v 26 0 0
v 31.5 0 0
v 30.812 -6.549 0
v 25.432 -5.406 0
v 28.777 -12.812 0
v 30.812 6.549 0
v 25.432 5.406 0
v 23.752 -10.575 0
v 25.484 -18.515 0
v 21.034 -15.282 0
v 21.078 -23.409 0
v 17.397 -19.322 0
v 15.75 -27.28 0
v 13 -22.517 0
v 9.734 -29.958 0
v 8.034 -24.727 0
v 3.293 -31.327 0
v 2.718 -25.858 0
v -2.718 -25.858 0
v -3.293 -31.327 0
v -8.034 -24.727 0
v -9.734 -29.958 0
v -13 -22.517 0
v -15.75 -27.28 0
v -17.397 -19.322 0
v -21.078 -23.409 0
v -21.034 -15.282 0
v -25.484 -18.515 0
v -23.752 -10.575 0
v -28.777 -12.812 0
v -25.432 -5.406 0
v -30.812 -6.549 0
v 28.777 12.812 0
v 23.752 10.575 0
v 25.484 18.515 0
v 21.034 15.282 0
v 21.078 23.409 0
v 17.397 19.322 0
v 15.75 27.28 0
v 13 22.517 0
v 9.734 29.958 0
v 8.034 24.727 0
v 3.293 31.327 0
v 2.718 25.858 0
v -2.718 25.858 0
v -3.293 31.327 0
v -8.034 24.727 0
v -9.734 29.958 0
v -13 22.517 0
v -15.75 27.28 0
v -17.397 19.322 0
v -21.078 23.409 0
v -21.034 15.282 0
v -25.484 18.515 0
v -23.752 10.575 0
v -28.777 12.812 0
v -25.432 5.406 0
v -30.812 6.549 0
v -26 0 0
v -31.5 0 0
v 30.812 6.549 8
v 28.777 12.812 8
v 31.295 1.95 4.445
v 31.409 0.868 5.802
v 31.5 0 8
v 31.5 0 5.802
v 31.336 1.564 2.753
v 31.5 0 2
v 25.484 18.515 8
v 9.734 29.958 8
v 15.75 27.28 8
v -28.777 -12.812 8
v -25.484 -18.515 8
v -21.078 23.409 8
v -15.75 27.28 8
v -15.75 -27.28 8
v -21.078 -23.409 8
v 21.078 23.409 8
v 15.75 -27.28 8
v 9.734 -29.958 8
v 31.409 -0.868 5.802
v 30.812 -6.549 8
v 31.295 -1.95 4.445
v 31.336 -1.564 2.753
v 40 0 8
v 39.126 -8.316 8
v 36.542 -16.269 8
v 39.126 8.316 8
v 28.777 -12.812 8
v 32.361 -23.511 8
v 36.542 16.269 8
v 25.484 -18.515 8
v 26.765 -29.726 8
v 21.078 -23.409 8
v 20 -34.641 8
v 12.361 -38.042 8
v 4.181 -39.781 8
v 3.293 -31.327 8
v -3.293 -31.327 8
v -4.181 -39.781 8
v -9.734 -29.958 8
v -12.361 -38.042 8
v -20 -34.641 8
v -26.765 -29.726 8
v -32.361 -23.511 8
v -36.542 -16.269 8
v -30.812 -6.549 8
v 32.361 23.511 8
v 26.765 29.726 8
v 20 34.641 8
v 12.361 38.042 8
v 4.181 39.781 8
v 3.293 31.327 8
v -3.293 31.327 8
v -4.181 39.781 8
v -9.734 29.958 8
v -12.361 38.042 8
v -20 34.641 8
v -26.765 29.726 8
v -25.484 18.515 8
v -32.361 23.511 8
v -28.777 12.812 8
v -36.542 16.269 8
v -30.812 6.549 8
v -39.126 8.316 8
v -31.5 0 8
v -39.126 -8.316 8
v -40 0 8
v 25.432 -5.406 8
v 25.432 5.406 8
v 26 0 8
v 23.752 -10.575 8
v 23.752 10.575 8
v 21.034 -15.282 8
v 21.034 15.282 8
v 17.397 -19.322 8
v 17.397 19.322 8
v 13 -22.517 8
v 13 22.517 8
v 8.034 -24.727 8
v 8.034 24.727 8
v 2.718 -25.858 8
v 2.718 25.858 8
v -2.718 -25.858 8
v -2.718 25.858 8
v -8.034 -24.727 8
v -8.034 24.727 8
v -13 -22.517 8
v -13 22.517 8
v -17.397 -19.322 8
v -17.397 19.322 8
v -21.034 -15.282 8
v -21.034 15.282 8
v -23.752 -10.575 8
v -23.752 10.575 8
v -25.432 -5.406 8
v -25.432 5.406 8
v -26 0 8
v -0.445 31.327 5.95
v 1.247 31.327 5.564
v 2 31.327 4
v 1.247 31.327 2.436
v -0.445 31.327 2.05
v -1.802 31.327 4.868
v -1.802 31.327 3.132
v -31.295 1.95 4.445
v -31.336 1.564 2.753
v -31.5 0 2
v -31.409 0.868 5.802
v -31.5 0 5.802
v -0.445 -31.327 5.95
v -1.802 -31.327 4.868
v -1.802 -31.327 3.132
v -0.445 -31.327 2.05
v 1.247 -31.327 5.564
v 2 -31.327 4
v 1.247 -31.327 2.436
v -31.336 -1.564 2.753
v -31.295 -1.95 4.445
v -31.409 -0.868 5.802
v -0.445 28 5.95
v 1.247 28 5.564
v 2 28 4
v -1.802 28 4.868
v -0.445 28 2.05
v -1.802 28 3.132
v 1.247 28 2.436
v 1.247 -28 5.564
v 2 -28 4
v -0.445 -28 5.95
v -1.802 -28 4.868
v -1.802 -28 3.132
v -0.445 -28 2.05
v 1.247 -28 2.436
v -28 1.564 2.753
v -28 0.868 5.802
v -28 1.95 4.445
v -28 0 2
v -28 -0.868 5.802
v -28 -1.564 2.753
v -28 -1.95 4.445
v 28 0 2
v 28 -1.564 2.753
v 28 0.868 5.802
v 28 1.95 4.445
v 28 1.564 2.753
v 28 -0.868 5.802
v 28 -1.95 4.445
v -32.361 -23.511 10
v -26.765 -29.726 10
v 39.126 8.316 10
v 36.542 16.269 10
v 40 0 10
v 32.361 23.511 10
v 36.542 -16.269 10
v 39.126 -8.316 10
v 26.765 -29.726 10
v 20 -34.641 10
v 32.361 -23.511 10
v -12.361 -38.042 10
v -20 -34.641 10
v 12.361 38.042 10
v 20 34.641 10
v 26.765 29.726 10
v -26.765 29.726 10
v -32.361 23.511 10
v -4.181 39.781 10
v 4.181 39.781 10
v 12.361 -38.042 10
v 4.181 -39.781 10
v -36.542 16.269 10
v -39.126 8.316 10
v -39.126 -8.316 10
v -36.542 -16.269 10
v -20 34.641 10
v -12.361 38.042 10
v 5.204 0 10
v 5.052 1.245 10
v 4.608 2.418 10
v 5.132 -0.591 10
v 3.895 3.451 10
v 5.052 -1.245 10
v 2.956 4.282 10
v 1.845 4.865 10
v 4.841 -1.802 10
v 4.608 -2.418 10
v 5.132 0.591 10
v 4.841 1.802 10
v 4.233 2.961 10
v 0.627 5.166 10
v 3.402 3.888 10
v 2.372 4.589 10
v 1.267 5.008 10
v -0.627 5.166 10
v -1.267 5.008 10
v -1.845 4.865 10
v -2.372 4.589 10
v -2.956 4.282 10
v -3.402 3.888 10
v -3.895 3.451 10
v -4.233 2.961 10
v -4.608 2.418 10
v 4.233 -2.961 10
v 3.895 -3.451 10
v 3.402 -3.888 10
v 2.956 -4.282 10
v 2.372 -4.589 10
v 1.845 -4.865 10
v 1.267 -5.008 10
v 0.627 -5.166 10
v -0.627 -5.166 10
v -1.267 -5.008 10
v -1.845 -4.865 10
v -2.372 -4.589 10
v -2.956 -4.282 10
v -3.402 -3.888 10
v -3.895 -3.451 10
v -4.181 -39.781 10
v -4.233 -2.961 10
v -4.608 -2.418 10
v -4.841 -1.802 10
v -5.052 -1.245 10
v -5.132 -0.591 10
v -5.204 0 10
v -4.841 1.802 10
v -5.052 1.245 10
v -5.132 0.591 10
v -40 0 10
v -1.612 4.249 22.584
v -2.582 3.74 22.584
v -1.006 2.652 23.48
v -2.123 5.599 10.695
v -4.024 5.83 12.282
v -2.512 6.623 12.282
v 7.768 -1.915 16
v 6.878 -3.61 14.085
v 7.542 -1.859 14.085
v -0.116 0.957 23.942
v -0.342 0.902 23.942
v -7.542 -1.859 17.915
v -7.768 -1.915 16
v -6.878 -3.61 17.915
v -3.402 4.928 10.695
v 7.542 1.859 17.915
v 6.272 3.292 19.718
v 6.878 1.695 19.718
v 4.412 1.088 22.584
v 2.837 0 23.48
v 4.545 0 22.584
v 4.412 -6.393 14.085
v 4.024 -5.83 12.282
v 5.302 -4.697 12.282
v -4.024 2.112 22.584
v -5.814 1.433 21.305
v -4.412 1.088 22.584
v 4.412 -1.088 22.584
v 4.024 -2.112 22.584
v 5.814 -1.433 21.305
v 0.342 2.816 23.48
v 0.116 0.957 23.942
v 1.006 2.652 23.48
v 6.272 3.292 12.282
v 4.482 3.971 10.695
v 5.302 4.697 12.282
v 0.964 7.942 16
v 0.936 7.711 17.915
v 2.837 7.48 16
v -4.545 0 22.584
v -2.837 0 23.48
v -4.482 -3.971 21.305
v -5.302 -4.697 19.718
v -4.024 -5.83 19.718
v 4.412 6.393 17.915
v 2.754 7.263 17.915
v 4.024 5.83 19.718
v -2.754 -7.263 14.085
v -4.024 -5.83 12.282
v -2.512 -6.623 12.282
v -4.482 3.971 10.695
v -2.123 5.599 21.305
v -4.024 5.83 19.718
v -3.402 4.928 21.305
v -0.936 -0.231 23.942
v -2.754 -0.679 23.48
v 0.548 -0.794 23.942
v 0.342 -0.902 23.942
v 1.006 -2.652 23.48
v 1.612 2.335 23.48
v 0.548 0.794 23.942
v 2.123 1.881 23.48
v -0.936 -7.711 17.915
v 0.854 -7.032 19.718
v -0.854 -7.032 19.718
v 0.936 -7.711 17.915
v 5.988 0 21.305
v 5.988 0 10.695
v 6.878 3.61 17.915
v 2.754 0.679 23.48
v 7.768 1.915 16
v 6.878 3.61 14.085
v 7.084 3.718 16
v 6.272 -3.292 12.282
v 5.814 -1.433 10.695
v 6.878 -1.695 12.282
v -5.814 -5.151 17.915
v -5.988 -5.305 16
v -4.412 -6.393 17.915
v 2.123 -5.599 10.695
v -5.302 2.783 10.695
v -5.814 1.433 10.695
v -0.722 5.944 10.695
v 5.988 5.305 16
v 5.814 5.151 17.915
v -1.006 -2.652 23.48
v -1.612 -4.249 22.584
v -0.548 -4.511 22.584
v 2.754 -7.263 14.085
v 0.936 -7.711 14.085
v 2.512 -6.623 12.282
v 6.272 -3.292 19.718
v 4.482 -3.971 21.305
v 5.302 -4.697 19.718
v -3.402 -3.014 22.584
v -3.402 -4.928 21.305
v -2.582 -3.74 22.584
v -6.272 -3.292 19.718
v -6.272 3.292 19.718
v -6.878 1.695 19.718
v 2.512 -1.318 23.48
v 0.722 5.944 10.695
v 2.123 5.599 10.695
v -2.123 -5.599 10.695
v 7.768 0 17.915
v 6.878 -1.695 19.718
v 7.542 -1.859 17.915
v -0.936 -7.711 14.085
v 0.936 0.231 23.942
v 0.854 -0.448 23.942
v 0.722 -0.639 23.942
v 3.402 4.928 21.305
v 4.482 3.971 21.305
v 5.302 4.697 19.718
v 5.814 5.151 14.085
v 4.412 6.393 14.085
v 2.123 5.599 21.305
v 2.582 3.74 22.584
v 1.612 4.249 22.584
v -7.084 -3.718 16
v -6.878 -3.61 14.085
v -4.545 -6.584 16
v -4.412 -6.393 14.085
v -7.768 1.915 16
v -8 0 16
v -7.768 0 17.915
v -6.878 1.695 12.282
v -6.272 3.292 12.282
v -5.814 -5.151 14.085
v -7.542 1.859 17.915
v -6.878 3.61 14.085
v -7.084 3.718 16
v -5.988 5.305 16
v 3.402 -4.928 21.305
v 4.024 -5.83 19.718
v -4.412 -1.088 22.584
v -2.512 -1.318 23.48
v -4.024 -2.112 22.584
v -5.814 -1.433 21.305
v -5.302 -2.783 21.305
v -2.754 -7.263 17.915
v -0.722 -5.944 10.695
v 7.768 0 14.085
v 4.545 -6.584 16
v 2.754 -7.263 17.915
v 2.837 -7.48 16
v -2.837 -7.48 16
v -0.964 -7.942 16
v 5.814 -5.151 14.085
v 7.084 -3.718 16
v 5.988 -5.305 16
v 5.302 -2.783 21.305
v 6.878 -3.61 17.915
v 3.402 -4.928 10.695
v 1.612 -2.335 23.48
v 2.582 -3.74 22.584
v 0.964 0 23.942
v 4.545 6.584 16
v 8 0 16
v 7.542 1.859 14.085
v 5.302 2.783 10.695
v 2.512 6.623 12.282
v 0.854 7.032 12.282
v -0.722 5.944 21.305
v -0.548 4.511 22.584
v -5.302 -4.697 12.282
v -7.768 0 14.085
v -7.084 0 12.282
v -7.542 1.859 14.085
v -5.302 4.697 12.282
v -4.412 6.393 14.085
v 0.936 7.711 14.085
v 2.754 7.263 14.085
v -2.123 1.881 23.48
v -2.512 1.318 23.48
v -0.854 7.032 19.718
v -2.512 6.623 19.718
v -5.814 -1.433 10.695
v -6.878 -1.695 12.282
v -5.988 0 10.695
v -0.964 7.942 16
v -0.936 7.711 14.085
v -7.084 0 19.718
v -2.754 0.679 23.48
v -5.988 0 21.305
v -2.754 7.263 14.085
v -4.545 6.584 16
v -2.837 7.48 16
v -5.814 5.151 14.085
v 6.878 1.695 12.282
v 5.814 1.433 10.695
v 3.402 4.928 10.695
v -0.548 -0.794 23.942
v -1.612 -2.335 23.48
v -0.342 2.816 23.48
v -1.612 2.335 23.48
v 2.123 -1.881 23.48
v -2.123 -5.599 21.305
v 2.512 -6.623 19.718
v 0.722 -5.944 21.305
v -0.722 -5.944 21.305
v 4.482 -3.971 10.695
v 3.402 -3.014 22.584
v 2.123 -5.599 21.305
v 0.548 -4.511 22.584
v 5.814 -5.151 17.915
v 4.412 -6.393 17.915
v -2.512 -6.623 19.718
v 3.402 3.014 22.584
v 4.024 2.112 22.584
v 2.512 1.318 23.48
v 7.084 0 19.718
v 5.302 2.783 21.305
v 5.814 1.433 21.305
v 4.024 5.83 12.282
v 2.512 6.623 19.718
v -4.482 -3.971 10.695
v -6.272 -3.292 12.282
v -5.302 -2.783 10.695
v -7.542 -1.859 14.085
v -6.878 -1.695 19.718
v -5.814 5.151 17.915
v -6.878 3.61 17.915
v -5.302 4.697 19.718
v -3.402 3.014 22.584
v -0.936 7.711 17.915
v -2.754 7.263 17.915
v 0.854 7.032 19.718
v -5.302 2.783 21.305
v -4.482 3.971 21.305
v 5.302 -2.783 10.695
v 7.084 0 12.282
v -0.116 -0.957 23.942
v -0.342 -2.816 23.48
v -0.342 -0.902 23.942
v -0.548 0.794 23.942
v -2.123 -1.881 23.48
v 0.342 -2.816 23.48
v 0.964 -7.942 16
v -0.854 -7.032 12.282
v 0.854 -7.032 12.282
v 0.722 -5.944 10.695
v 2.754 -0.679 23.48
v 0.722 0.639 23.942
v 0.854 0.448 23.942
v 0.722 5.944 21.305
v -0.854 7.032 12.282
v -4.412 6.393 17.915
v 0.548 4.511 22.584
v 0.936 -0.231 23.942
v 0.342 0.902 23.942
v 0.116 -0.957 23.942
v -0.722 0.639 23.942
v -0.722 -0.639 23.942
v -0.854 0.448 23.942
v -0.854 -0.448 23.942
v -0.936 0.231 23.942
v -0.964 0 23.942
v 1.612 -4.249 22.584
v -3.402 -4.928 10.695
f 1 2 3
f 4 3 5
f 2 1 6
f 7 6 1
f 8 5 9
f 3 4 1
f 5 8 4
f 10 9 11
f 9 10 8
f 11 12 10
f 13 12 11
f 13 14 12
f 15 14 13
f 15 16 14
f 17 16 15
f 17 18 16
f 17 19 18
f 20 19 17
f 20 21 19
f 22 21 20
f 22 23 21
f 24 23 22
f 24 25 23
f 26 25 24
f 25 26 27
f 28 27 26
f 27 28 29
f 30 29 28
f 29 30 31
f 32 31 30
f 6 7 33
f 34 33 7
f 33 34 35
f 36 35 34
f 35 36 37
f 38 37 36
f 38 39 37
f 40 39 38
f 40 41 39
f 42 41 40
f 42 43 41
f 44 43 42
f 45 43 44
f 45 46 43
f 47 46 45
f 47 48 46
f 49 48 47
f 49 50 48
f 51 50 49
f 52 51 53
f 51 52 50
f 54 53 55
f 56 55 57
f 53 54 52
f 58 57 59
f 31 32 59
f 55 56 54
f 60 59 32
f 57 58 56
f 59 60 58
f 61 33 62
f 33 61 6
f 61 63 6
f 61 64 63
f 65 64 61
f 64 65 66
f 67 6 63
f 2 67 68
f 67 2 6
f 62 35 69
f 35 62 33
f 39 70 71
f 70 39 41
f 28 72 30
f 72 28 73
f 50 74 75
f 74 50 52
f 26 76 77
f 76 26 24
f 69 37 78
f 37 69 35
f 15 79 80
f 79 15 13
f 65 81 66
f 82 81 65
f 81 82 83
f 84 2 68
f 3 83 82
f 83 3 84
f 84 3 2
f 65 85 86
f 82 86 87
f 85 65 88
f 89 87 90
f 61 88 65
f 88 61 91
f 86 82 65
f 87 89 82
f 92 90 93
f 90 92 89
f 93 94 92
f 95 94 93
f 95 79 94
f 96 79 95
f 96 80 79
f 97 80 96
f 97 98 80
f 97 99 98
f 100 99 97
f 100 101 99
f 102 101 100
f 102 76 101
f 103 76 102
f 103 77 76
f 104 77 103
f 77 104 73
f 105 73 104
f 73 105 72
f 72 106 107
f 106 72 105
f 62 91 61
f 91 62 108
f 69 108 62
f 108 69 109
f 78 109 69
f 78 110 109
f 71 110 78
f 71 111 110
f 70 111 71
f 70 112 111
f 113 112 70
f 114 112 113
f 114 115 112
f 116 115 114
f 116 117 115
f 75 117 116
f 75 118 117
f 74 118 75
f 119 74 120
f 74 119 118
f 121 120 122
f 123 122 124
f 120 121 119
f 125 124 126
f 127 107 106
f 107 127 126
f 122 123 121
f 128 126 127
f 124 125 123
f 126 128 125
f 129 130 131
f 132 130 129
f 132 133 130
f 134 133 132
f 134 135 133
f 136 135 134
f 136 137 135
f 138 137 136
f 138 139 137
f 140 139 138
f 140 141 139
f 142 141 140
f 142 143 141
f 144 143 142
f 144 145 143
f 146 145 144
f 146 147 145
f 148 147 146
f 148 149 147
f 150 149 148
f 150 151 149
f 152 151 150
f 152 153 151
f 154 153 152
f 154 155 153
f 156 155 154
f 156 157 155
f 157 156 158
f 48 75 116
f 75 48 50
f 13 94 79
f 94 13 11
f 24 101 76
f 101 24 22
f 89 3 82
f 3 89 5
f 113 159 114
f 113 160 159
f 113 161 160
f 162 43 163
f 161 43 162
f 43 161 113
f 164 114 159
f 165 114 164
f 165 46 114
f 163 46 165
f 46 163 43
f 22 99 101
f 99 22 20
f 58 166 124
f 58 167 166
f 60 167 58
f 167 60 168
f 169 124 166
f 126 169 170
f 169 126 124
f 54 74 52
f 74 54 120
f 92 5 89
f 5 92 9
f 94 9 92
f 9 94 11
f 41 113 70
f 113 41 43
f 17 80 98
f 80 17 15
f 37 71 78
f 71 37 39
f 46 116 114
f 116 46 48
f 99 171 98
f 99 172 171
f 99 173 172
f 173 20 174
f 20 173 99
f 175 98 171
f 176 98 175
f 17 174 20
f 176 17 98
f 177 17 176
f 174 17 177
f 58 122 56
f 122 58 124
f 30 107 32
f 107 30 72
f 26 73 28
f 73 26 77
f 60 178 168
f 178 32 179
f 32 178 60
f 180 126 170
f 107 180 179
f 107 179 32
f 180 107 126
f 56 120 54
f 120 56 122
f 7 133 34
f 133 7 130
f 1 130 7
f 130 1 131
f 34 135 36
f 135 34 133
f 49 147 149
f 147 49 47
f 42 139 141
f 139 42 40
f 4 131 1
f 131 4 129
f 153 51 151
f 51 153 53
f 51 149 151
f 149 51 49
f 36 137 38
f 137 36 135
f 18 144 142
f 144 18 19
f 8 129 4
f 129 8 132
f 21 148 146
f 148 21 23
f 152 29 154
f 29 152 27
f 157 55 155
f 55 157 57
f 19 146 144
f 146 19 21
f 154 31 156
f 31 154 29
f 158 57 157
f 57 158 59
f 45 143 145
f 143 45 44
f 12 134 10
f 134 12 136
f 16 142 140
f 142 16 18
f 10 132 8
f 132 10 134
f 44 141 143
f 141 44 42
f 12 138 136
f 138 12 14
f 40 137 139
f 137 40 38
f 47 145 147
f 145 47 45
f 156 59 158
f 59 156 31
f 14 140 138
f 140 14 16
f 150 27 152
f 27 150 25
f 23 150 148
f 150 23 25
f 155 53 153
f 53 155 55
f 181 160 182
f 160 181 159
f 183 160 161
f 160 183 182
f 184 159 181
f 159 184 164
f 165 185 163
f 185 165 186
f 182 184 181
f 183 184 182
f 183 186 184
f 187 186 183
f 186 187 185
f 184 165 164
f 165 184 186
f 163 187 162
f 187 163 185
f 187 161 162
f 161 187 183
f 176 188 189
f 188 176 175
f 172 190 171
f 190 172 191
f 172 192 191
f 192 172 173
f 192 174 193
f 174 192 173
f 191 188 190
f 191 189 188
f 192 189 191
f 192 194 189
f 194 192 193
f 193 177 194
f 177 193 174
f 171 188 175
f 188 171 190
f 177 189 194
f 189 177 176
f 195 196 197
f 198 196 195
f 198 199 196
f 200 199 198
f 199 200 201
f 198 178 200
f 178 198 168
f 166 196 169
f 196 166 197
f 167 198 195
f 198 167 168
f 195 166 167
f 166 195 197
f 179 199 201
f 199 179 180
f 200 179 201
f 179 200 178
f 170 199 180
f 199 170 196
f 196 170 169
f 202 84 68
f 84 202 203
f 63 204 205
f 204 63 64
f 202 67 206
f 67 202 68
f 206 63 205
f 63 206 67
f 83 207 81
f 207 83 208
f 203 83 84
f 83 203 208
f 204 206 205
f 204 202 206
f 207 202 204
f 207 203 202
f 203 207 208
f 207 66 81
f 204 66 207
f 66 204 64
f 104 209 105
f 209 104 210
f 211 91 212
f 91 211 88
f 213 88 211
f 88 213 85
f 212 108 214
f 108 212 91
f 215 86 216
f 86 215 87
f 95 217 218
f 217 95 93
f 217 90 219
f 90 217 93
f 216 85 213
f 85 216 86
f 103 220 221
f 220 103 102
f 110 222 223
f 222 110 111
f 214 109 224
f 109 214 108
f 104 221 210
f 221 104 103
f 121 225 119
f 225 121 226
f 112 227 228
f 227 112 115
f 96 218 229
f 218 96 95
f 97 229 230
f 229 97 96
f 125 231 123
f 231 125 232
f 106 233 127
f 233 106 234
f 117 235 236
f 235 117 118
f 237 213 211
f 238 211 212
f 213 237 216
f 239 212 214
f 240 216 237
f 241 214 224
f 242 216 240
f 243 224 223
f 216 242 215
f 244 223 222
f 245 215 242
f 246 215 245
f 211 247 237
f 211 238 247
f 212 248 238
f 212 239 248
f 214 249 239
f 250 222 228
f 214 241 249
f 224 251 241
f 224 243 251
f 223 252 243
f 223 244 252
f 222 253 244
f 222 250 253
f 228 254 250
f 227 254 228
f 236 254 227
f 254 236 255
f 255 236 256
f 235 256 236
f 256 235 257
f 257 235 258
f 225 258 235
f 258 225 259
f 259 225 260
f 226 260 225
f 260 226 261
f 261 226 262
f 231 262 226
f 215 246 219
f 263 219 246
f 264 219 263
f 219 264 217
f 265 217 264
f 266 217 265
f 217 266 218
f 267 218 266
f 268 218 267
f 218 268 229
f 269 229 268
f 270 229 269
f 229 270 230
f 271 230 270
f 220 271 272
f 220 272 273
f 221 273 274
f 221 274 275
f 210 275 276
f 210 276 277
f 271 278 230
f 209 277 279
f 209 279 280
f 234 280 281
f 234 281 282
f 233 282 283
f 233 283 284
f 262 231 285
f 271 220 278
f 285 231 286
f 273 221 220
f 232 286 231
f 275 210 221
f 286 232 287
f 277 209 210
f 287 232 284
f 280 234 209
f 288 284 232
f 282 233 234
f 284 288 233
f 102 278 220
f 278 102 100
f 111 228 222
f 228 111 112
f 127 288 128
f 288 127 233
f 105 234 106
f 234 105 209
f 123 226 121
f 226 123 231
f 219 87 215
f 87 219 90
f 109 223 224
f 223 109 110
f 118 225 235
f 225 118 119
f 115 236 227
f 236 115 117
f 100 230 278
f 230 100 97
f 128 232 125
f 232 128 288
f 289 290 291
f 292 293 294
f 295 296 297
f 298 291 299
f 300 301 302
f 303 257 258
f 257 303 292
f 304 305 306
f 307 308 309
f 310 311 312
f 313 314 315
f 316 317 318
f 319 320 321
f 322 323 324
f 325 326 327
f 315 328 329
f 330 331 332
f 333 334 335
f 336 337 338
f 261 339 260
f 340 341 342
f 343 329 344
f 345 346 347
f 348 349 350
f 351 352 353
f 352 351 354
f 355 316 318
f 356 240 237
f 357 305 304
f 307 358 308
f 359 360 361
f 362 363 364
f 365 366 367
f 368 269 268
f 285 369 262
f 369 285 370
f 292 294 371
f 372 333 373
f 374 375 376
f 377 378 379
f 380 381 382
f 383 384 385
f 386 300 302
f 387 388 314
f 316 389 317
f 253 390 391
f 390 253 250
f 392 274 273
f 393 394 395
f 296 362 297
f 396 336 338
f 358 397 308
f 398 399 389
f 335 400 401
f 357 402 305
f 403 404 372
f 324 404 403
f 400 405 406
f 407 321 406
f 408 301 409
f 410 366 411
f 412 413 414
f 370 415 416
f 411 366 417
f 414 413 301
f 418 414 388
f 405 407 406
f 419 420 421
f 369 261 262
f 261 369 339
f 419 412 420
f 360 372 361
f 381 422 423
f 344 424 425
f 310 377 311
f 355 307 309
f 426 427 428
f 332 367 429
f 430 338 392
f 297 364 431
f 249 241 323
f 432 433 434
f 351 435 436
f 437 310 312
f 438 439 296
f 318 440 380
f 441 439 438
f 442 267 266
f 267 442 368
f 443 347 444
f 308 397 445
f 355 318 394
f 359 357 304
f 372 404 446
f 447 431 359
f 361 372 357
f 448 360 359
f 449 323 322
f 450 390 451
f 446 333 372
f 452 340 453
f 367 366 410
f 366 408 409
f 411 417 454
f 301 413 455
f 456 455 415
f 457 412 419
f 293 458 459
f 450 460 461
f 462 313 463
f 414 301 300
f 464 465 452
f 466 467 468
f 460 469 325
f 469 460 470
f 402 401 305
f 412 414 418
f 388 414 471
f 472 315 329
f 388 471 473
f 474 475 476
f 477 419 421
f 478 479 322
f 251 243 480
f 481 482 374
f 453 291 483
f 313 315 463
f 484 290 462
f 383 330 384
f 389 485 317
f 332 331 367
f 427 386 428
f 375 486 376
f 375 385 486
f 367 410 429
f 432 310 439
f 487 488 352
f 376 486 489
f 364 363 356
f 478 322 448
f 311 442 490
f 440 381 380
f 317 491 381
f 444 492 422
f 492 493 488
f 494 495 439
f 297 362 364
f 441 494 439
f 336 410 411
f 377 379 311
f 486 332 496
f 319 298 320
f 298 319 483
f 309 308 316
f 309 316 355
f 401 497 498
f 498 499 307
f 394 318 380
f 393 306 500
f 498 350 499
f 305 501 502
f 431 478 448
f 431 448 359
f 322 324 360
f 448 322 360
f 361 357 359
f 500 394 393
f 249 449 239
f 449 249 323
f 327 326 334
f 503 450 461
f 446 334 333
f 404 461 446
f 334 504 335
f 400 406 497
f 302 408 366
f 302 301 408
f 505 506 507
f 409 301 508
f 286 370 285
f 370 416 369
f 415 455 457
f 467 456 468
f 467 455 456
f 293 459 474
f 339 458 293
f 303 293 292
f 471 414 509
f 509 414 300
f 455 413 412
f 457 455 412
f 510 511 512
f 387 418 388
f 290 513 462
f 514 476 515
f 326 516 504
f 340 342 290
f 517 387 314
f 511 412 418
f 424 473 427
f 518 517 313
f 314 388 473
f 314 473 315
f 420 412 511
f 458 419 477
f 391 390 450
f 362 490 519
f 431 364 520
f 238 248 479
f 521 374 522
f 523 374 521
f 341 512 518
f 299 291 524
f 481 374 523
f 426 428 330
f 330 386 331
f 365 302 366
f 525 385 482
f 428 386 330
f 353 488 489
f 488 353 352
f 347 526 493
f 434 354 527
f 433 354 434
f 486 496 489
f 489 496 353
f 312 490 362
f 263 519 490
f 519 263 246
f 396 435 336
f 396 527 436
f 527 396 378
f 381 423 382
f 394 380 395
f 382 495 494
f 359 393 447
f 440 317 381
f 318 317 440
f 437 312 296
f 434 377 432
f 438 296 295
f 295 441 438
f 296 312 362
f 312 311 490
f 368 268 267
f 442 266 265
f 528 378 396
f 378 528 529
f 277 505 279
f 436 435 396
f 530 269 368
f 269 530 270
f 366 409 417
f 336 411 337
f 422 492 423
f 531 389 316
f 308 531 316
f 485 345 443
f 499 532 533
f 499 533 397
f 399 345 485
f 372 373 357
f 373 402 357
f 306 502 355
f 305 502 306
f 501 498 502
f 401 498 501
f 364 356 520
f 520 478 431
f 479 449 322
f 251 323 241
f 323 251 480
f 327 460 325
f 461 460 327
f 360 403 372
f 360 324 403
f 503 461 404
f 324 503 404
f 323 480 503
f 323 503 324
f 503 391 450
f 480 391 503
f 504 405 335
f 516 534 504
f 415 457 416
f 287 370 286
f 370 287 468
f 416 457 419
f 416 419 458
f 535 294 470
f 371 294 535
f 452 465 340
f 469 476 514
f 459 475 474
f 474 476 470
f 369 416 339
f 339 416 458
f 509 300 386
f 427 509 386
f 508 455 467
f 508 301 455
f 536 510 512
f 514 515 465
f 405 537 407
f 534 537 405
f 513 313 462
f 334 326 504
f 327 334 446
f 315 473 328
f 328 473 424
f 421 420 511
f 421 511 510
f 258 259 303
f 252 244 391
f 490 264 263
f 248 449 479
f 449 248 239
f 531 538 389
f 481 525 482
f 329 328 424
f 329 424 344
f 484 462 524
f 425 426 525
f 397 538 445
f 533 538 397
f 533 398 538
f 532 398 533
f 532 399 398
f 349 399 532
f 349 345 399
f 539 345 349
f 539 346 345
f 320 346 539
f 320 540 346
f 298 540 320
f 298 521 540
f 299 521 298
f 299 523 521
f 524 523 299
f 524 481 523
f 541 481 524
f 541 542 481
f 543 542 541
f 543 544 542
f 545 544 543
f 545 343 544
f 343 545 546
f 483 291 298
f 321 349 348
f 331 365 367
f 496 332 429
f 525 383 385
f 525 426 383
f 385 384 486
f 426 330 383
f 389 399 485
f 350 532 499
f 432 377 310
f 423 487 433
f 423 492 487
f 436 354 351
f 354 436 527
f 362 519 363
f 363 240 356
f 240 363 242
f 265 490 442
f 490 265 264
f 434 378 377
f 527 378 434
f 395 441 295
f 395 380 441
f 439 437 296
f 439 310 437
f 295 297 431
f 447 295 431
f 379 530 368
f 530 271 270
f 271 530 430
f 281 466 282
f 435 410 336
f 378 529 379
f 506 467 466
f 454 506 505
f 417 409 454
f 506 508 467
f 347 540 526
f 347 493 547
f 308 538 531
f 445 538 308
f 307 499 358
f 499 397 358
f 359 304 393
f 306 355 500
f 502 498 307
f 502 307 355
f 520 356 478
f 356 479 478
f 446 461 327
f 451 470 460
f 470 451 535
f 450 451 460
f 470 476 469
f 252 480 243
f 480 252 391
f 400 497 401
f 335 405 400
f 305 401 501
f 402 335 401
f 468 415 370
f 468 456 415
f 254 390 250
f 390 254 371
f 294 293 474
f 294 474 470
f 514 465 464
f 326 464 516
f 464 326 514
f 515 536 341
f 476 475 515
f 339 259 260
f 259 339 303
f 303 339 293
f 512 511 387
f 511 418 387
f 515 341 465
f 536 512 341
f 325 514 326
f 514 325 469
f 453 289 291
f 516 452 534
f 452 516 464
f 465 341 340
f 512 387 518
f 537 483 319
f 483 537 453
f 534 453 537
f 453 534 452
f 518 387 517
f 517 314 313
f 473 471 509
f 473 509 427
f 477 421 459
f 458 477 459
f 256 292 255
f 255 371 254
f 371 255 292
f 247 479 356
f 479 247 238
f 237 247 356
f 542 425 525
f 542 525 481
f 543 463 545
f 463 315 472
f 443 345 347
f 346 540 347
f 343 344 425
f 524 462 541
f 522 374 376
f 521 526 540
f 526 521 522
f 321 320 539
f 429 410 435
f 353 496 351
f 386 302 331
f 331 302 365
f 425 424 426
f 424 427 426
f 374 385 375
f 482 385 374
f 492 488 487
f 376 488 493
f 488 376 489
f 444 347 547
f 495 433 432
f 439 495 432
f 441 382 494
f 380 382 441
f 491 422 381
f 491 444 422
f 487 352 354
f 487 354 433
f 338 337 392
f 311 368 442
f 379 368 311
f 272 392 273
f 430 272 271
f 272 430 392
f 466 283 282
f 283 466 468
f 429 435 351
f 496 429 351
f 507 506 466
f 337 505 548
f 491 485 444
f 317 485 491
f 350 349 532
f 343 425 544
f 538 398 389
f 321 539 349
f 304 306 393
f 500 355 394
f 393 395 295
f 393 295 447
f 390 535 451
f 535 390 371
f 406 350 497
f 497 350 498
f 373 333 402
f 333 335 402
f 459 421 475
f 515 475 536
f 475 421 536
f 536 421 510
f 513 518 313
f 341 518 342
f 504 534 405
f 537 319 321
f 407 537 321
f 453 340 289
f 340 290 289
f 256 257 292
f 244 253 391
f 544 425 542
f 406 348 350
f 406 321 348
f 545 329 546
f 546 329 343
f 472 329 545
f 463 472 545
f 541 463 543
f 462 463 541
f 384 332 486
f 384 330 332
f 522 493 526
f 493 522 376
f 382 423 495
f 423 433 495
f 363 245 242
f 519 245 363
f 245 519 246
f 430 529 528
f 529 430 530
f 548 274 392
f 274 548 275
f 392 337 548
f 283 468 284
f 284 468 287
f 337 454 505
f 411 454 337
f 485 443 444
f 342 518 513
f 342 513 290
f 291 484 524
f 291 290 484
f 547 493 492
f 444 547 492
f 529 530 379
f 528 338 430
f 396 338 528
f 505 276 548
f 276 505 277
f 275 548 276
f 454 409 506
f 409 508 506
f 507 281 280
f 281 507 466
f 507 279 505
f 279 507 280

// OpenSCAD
// Centrifugal Puzzle Box - Base Model

module cpbLid(radius, thickness, clearance){
    difference(){
        cylinder(h=4*thickness, r=radius-4*thickness-clearance);
        cylinder(h=4*thickness, r=radius-7*thickness);
        translate([0,radius-4*thickness,2*thickness]) 
            rotate([90,0,0]) 
                cylinder(h=4*thickness, r=thickness, center=true);
        translate([0,-radius+4*thickness,2*thickness]) 
            rotate([90,0,0]) 
                cylinder(h=4*thickness, r=thickness, center=true);
        translate([-radius+4*thickness,0,2*thickness]) 
            rotate([0,90,0]) 
                cylinder(h=4*thickness, r=thickness, center=true);
        translate([radius-4*thickness,0,2*thickness]) 
            rotate([0,90,0]) 
                cylinder(h=4*thickness, r=thickness, center=true);
    }
    translate([0,0,4*thickness]) 
        cylinder(h=thickness, r=radius);
    translate([0,0,8*thickness]) 
        sphere(r=4*thickness);
}




// Main Model
radius = 40;
width = 20;
thickness = 2;

clearance = 0.5;

cpbLid(radius, thickness, clearance);
